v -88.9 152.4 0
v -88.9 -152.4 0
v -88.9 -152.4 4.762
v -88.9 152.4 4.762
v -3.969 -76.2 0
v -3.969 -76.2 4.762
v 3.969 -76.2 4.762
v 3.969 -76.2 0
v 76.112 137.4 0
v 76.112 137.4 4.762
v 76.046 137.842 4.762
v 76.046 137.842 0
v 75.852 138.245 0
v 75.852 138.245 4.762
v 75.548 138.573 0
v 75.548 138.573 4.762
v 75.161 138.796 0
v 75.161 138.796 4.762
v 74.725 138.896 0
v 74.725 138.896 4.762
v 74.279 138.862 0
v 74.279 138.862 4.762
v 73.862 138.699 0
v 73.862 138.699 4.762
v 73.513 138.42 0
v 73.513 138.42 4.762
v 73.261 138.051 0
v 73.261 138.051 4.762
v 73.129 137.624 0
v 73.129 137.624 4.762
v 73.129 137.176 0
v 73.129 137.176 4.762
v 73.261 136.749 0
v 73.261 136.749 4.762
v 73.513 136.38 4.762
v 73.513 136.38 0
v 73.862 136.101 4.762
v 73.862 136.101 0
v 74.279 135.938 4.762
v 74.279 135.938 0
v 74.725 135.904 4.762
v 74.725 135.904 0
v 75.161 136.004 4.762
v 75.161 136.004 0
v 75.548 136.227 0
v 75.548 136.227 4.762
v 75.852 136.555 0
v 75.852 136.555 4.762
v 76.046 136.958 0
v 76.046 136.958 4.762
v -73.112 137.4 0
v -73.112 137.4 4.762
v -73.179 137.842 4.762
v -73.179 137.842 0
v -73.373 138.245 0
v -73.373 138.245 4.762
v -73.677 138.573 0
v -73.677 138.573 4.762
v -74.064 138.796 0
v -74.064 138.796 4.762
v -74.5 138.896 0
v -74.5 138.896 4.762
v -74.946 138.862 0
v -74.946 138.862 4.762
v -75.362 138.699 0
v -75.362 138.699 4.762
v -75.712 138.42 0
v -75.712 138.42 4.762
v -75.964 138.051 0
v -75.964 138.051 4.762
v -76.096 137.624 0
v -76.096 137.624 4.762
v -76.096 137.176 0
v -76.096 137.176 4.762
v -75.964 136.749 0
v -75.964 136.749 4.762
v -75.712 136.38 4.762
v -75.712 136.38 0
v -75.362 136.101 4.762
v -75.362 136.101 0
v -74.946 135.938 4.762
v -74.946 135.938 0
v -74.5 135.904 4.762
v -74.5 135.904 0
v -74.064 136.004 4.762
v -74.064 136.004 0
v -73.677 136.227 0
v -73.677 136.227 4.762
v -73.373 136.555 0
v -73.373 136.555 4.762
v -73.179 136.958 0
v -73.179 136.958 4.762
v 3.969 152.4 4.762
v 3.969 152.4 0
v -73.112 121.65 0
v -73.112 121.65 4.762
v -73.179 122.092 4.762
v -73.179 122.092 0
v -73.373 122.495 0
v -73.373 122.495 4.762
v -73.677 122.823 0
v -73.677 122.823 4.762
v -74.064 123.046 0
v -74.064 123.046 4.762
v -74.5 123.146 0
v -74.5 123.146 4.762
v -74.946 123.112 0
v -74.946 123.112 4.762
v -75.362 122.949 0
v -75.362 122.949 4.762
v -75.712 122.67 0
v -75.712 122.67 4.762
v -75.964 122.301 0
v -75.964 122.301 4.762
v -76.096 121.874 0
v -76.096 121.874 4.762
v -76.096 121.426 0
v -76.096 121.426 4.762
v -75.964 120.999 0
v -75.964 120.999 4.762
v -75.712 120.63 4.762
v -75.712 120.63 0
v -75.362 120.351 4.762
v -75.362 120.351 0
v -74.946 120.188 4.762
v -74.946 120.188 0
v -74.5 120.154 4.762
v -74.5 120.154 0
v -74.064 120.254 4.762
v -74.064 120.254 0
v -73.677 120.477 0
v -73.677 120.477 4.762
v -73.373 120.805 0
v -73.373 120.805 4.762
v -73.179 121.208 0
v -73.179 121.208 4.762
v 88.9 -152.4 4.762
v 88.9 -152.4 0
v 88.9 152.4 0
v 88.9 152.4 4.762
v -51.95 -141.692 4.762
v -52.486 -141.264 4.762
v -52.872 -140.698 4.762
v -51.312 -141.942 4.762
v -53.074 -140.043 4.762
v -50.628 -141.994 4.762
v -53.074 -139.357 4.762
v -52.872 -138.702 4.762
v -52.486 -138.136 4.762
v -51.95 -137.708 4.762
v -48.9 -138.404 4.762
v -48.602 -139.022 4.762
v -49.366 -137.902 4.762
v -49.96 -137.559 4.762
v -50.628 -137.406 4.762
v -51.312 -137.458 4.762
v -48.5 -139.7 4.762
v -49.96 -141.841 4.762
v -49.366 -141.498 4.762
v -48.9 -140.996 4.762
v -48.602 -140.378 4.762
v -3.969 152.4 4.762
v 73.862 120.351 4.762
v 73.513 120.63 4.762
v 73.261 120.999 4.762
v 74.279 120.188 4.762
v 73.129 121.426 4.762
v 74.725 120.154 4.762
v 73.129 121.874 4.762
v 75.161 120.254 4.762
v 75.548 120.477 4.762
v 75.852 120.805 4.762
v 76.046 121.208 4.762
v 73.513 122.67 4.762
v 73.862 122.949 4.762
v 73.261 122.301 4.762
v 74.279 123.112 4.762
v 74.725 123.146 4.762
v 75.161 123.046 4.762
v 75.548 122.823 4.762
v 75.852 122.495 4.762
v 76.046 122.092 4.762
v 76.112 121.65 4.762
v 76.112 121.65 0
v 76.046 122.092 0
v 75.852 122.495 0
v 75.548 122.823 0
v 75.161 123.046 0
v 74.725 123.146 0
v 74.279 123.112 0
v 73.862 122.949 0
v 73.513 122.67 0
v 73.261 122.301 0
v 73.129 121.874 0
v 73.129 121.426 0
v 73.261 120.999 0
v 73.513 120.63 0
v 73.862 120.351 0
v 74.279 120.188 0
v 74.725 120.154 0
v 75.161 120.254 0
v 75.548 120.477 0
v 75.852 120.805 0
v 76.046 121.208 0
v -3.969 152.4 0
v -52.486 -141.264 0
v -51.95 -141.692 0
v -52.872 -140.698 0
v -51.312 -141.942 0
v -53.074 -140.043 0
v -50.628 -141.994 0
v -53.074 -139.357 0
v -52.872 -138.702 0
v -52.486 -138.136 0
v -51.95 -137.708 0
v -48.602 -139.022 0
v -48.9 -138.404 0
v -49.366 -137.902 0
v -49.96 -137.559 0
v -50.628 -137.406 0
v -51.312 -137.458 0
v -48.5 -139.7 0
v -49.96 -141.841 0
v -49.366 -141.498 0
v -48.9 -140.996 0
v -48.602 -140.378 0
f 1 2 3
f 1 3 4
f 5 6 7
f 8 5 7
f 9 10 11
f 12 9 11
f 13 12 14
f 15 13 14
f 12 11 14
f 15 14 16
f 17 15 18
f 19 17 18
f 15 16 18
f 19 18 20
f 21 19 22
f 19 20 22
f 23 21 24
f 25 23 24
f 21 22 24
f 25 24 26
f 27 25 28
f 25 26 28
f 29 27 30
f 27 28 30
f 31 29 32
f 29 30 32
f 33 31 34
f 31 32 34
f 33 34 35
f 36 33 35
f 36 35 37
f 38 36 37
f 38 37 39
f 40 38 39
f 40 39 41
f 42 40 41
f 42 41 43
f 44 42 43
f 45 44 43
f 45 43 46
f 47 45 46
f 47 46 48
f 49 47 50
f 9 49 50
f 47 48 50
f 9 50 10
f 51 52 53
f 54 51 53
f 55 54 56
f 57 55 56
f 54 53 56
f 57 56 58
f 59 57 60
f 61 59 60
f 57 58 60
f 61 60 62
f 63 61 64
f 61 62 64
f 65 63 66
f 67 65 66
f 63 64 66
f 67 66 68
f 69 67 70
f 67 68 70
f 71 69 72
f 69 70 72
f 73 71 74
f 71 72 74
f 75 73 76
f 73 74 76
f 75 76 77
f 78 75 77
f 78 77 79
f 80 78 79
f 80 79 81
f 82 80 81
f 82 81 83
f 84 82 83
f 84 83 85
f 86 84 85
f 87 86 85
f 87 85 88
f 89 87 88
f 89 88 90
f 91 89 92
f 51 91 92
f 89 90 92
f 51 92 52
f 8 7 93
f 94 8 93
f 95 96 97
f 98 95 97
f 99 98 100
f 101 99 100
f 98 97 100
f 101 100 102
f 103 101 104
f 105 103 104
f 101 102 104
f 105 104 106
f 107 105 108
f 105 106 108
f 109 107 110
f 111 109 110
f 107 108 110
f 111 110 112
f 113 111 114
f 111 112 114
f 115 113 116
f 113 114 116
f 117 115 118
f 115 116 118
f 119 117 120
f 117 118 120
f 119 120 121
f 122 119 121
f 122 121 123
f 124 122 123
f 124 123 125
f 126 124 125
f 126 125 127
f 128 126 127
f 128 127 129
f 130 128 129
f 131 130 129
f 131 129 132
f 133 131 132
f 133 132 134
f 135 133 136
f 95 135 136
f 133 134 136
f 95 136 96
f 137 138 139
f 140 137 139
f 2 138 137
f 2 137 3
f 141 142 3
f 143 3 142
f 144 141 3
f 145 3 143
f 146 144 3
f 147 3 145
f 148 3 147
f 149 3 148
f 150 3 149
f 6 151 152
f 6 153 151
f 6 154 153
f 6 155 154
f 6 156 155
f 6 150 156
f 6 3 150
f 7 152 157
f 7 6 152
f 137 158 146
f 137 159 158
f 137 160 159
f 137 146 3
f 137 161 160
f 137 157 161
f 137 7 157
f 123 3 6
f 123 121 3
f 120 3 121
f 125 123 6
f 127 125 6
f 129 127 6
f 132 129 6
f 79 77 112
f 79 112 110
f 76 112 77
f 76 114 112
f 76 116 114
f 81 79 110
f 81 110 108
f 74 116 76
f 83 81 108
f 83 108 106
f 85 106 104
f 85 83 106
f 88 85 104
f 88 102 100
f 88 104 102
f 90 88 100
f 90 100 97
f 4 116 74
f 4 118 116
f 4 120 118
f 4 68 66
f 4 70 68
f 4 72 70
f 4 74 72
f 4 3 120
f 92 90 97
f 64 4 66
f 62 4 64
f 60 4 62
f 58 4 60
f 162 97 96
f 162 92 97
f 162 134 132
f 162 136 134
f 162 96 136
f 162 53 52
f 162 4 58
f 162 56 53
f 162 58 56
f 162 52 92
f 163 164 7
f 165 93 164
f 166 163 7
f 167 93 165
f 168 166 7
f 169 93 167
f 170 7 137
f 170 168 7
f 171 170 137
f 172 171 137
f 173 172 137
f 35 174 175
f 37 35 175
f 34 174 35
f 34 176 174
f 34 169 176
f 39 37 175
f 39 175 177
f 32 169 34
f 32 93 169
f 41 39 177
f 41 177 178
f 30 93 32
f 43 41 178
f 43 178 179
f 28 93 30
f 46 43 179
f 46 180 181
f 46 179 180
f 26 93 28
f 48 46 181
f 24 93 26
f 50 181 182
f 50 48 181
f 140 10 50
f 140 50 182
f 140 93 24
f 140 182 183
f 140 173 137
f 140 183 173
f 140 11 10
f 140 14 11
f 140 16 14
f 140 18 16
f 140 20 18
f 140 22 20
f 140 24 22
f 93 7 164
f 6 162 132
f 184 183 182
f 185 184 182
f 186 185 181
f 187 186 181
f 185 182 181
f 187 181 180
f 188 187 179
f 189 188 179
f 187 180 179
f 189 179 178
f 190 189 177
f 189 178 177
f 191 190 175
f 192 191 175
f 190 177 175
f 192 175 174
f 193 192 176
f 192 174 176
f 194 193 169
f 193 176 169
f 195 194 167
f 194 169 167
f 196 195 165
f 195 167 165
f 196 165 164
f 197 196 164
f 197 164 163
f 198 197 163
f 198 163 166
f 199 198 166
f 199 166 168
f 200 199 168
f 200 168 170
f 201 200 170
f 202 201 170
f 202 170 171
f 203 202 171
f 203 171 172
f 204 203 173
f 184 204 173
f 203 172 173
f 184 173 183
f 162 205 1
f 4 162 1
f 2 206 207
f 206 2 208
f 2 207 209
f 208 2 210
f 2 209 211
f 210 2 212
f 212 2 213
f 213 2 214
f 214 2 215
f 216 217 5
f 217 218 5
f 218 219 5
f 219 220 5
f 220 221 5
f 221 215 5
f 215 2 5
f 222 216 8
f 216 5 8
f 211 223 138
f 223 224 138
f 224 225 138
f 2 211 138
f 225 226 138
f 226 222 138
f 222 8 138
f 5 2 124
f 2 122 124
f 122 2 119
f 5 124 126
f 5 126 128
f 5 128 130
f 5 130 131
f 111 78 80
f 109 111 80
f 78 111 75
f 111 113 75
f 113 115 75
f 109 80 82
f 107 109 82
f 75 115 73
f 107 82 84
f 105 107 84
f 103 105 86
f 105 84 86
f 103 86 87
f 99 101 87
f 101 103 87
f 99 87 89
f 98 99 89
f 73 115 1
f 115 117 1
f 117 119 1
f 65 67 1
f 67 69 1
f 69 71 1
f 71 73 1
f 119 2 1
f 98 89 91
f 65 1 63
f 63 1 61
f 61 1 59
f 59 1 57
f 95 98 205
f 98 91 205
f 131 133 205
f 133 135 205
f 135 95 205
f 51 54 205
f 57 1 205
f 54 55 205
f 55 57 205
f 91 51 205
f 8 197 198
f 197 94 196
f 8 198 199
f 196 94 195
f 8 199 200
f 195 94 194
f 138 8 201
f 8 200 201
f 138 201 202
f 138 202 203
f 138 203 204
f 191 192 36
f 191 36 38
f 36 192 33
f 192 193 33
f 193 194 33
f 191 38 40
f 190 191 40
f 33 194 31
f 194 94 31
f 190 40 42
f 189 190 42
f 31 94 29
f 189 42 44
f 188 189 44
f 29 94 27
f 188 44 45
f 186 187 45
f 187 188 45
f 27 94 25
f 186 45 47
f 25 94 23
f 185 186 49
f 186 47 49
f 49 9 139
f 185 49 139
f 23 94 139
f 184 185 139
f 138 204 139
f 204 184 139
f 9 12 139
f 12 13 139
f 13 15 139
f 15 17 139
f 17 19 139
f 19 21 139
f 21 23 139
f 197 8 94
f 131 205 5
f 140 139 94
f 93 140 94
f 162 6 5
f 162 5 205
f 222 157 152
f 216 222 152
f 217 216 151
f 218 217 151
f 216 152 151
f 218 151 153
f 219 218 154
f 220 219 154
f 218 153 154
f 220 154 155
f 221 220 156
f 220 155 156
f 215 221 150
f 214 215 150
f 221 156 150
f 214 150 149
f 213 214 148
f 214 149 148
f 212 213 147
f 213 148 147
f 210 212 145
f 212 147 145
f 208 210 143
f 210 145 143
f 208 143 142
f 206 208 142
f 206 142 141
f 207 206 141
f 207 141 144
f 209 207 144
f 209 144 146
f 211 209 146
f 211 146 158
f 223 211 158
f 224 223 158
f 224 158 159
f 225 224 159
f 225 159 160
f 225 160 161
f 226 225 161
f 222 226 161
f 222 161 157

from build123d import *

# Parameters (mm, degrees)
SKETCH2_W           = 4.7625
SKETCH2_H           = 44.223214285
SKETCH2_H_2         = 44.223214286
SKETCH2_W_2         = 21.998214286
SKETCH2_H_3         = 4.7625
SKETCH2_W_3         = 26.760714286
BOSS_EXTRUDE1_DEPTH = 4.7625
SKETCH3_W           = 7.9375
SKETCH3_H           = 228.6
CUT_EXTRUDE1_DEPTH  = 184.017476539
SKETCH4_R           = 2.3
CUT_EXTRUDE2_DEPTH  = 184.017476539
SKETCH5_R           = 1.5
CUT_EXTRUDE3_DEPTH  = 4.7625
SKETCH6_W           = 4.7625
SKETCH6_H           = 44.223214286
BOSS_EXTRUDE2_DEPTH = 4.7625
SKETCH7_W           = 26.760714286
SKETCH7_H           = 4.7625
CUT_EXTRUDE4_DEPTH  = 4.7625
SKETCH9_W           = 4.7625
SKETCH9_H           = 221.116071428
SKETCH9_W_2         = 21.998214286
SKETCH9_H_2         = 4.7625
CUT_EXTRUDE5_DEPTH  = 4.7625


with BuildPart() as part:
    # Sketch2 → Boss-Extrude1 (new body)
    with BuildSketch(Plane.XY):
        Polygon((0, -152.4), (0, 152.4), (-88.9, 152.4), (-88.9, 108.176785714), (-88.9, 63.953571429), (-88.9, 19.730357143), (-88.9, -24.492857143), (-88.9, -68.716071429), (-88.9, -112.939285714), (-88.9, -152.4), (-66.901785714, -152.4), (-40.141071429, -152.4), (-13.380357143, -152.4), align=None)
        Polygon((88.9, 152.4), (0, 152.4), (0, -152.4), (13.380357143, -152.4), (40.141071429, -152.4), (66.901785714, -152.4), (88.9, -152.4), (88.9, -112.939285714), (88.9, -68.716071429), (88.9, -24.492857143), (88.9, 19.730357143), (88.9, 63.953571429), (88.9, 108.176785714), align=None)
        with Locations((-91.28125, 86.065178572)):
            Rectangle(SKETCH2_W, SKETCH2_H)
        with Locations((-91.28125, -2.38125)):
            Rectangle(SKETCH2_W, SKETCH2_H_2)
        with Locations((-91.28125, -90.827678572)):
            Rectangle(SKETCH2_W, SKETCH2_H)
        with Locations((-77.900892857, -154.78125)):
            Rectangle(SKETCH2_W_2, SKETCH2_H_3)
        with Locations((-26.760714286, -154.78125)):
            Rectangle(SKETCH2_W_3, SKETCH2_H_3)
        with Locations((26.760714286, -154.78125)):
            Rectangle(SKETCH2_W_3, SKETCH2_H_3)
        with Locations((91.28125, -90.827678572)):
            Rectangle(SKETCH2_W, SKETCH2_H)
        with Locations((91.28125, -2.38125)):
            Rectangle(SKETCH2_W, SKETCH2_H_2)
        with Locations((91.28125, 86.065178572)):
            Rectangle(SKETCH2_W, SKETCH2_H)
        with Locations((77.900892857, -154.78125)):
            Rectangle(SKETCH2_W_2, SKETCH2_H_3)
    extrude(amount=BOSS_EXTRUDE1_DEPTH)

    # Sketch3 → Cut-Extrude1 (cut, through all)
    with BuildSketch(Plane.XY.offset(4.7625)):
        with Locations((0, 38.1)):
            Rectangle(SKETCH3_W, SKETCH3_H)
    extrude(amount=-CUT_EXTRUDE1_DEPTH, mode=Mode.SUBTRACT)

    # Sketch4 → Cut-Extrude2 (cut, through all)
    with BuildSketch(Plane.XY.offset(4.7625)):
        with Locations((-50.8, -139.7)):
            Circle(SKETCH4_R)
    extrude(amount=-CUT_EXTRUDE2_DEPTH, mode=Mode.SUBTRACT)

    # Sketch5 → Cut-Extrude3 (cut)
    with BuildSketch(Plane.XY.offset(4.7625)):
        with Locations((-74.6125, 137.4)):
            Circle(SKETCH5_R)
        with Locations((-74.6125, 121.65)):
            Circle(SKETCH5_R)
        with Locations((74.6125, 121.65)):
            Circle(SKETCH5_R)
        with Locations((74.6125, 137.4)):
            Circle(SKETCH5_R)
    extrude(amount=-CUT_EXTRUDE3_DEPTH, mode=Mode.SUBTRACT)

    # Sketch6 → Boss-Extrude2 (add)
    with BuildSketch(Plane.XY.offset(4.7625)):
        with Locations((-91.28125, 41.841964286)):
            Rectangle(SKETCH6_W, SKETCH6_H)
        with Locations((-91.28125, -46.604464286)):
            Rectangle(SKETCH6_W, SKETCH6_H)
        with Locations((91.28125, 41.841964286)):
            Rectangle(SKETCH6_W, SKETCH6_H)
        with Locations((91.28125, -46.604464286)):
            Rectangle(SKETCH6_W, SKETCH6_H)
    extrude(amount=-BOSS_EXTRUDE2_DEPTH)

    # Sketch7 → Cut-Extrude4 (cut)
    with BuildSketch(Plane.XY.offset(4.7625)):
        with Locations((-26.760714286, -154.78125)):
            Rectangle(SKETCH7_W, SKETCH7_H)
        with Locations((26.760714286, -154.78125)):
            Rectangle(SKETCH7_W, SKETCH7_H)
    extrude(amount=-CUT_EXTRUDE4_DEPTH, mode=Mode.SUBTRACT)

    # Sketch9 → Cut-Extrude5 (cut)
    with BuildSketch(Plane(origin=(0, 0, 0), x_dir=(-1, 0, 0), z_dir=(0, 0, -1))):
        with Locations((-91.28125, -2.38125)):
            Rectangle(SKETCH9_W, SKETCH9_H)
        with Locations((91.28125, -2.38125)):
            Rectangle(SKETCH9_W, SKETCH9_H)
        with Locations((-77.900892857, -154.78125)):
            Rectangle(SKETCH9_W_2, SKETCH9_H_2)
        with Locations((77.900892857, -154.78125)):
            Rectangle(SKETCH9_W_2, SKETCH9_H_2)
    extrude(amount=-CUT_EXTRUDE5_DEPTH, mode=Mode.SUBTRACT)


solid = part.part
